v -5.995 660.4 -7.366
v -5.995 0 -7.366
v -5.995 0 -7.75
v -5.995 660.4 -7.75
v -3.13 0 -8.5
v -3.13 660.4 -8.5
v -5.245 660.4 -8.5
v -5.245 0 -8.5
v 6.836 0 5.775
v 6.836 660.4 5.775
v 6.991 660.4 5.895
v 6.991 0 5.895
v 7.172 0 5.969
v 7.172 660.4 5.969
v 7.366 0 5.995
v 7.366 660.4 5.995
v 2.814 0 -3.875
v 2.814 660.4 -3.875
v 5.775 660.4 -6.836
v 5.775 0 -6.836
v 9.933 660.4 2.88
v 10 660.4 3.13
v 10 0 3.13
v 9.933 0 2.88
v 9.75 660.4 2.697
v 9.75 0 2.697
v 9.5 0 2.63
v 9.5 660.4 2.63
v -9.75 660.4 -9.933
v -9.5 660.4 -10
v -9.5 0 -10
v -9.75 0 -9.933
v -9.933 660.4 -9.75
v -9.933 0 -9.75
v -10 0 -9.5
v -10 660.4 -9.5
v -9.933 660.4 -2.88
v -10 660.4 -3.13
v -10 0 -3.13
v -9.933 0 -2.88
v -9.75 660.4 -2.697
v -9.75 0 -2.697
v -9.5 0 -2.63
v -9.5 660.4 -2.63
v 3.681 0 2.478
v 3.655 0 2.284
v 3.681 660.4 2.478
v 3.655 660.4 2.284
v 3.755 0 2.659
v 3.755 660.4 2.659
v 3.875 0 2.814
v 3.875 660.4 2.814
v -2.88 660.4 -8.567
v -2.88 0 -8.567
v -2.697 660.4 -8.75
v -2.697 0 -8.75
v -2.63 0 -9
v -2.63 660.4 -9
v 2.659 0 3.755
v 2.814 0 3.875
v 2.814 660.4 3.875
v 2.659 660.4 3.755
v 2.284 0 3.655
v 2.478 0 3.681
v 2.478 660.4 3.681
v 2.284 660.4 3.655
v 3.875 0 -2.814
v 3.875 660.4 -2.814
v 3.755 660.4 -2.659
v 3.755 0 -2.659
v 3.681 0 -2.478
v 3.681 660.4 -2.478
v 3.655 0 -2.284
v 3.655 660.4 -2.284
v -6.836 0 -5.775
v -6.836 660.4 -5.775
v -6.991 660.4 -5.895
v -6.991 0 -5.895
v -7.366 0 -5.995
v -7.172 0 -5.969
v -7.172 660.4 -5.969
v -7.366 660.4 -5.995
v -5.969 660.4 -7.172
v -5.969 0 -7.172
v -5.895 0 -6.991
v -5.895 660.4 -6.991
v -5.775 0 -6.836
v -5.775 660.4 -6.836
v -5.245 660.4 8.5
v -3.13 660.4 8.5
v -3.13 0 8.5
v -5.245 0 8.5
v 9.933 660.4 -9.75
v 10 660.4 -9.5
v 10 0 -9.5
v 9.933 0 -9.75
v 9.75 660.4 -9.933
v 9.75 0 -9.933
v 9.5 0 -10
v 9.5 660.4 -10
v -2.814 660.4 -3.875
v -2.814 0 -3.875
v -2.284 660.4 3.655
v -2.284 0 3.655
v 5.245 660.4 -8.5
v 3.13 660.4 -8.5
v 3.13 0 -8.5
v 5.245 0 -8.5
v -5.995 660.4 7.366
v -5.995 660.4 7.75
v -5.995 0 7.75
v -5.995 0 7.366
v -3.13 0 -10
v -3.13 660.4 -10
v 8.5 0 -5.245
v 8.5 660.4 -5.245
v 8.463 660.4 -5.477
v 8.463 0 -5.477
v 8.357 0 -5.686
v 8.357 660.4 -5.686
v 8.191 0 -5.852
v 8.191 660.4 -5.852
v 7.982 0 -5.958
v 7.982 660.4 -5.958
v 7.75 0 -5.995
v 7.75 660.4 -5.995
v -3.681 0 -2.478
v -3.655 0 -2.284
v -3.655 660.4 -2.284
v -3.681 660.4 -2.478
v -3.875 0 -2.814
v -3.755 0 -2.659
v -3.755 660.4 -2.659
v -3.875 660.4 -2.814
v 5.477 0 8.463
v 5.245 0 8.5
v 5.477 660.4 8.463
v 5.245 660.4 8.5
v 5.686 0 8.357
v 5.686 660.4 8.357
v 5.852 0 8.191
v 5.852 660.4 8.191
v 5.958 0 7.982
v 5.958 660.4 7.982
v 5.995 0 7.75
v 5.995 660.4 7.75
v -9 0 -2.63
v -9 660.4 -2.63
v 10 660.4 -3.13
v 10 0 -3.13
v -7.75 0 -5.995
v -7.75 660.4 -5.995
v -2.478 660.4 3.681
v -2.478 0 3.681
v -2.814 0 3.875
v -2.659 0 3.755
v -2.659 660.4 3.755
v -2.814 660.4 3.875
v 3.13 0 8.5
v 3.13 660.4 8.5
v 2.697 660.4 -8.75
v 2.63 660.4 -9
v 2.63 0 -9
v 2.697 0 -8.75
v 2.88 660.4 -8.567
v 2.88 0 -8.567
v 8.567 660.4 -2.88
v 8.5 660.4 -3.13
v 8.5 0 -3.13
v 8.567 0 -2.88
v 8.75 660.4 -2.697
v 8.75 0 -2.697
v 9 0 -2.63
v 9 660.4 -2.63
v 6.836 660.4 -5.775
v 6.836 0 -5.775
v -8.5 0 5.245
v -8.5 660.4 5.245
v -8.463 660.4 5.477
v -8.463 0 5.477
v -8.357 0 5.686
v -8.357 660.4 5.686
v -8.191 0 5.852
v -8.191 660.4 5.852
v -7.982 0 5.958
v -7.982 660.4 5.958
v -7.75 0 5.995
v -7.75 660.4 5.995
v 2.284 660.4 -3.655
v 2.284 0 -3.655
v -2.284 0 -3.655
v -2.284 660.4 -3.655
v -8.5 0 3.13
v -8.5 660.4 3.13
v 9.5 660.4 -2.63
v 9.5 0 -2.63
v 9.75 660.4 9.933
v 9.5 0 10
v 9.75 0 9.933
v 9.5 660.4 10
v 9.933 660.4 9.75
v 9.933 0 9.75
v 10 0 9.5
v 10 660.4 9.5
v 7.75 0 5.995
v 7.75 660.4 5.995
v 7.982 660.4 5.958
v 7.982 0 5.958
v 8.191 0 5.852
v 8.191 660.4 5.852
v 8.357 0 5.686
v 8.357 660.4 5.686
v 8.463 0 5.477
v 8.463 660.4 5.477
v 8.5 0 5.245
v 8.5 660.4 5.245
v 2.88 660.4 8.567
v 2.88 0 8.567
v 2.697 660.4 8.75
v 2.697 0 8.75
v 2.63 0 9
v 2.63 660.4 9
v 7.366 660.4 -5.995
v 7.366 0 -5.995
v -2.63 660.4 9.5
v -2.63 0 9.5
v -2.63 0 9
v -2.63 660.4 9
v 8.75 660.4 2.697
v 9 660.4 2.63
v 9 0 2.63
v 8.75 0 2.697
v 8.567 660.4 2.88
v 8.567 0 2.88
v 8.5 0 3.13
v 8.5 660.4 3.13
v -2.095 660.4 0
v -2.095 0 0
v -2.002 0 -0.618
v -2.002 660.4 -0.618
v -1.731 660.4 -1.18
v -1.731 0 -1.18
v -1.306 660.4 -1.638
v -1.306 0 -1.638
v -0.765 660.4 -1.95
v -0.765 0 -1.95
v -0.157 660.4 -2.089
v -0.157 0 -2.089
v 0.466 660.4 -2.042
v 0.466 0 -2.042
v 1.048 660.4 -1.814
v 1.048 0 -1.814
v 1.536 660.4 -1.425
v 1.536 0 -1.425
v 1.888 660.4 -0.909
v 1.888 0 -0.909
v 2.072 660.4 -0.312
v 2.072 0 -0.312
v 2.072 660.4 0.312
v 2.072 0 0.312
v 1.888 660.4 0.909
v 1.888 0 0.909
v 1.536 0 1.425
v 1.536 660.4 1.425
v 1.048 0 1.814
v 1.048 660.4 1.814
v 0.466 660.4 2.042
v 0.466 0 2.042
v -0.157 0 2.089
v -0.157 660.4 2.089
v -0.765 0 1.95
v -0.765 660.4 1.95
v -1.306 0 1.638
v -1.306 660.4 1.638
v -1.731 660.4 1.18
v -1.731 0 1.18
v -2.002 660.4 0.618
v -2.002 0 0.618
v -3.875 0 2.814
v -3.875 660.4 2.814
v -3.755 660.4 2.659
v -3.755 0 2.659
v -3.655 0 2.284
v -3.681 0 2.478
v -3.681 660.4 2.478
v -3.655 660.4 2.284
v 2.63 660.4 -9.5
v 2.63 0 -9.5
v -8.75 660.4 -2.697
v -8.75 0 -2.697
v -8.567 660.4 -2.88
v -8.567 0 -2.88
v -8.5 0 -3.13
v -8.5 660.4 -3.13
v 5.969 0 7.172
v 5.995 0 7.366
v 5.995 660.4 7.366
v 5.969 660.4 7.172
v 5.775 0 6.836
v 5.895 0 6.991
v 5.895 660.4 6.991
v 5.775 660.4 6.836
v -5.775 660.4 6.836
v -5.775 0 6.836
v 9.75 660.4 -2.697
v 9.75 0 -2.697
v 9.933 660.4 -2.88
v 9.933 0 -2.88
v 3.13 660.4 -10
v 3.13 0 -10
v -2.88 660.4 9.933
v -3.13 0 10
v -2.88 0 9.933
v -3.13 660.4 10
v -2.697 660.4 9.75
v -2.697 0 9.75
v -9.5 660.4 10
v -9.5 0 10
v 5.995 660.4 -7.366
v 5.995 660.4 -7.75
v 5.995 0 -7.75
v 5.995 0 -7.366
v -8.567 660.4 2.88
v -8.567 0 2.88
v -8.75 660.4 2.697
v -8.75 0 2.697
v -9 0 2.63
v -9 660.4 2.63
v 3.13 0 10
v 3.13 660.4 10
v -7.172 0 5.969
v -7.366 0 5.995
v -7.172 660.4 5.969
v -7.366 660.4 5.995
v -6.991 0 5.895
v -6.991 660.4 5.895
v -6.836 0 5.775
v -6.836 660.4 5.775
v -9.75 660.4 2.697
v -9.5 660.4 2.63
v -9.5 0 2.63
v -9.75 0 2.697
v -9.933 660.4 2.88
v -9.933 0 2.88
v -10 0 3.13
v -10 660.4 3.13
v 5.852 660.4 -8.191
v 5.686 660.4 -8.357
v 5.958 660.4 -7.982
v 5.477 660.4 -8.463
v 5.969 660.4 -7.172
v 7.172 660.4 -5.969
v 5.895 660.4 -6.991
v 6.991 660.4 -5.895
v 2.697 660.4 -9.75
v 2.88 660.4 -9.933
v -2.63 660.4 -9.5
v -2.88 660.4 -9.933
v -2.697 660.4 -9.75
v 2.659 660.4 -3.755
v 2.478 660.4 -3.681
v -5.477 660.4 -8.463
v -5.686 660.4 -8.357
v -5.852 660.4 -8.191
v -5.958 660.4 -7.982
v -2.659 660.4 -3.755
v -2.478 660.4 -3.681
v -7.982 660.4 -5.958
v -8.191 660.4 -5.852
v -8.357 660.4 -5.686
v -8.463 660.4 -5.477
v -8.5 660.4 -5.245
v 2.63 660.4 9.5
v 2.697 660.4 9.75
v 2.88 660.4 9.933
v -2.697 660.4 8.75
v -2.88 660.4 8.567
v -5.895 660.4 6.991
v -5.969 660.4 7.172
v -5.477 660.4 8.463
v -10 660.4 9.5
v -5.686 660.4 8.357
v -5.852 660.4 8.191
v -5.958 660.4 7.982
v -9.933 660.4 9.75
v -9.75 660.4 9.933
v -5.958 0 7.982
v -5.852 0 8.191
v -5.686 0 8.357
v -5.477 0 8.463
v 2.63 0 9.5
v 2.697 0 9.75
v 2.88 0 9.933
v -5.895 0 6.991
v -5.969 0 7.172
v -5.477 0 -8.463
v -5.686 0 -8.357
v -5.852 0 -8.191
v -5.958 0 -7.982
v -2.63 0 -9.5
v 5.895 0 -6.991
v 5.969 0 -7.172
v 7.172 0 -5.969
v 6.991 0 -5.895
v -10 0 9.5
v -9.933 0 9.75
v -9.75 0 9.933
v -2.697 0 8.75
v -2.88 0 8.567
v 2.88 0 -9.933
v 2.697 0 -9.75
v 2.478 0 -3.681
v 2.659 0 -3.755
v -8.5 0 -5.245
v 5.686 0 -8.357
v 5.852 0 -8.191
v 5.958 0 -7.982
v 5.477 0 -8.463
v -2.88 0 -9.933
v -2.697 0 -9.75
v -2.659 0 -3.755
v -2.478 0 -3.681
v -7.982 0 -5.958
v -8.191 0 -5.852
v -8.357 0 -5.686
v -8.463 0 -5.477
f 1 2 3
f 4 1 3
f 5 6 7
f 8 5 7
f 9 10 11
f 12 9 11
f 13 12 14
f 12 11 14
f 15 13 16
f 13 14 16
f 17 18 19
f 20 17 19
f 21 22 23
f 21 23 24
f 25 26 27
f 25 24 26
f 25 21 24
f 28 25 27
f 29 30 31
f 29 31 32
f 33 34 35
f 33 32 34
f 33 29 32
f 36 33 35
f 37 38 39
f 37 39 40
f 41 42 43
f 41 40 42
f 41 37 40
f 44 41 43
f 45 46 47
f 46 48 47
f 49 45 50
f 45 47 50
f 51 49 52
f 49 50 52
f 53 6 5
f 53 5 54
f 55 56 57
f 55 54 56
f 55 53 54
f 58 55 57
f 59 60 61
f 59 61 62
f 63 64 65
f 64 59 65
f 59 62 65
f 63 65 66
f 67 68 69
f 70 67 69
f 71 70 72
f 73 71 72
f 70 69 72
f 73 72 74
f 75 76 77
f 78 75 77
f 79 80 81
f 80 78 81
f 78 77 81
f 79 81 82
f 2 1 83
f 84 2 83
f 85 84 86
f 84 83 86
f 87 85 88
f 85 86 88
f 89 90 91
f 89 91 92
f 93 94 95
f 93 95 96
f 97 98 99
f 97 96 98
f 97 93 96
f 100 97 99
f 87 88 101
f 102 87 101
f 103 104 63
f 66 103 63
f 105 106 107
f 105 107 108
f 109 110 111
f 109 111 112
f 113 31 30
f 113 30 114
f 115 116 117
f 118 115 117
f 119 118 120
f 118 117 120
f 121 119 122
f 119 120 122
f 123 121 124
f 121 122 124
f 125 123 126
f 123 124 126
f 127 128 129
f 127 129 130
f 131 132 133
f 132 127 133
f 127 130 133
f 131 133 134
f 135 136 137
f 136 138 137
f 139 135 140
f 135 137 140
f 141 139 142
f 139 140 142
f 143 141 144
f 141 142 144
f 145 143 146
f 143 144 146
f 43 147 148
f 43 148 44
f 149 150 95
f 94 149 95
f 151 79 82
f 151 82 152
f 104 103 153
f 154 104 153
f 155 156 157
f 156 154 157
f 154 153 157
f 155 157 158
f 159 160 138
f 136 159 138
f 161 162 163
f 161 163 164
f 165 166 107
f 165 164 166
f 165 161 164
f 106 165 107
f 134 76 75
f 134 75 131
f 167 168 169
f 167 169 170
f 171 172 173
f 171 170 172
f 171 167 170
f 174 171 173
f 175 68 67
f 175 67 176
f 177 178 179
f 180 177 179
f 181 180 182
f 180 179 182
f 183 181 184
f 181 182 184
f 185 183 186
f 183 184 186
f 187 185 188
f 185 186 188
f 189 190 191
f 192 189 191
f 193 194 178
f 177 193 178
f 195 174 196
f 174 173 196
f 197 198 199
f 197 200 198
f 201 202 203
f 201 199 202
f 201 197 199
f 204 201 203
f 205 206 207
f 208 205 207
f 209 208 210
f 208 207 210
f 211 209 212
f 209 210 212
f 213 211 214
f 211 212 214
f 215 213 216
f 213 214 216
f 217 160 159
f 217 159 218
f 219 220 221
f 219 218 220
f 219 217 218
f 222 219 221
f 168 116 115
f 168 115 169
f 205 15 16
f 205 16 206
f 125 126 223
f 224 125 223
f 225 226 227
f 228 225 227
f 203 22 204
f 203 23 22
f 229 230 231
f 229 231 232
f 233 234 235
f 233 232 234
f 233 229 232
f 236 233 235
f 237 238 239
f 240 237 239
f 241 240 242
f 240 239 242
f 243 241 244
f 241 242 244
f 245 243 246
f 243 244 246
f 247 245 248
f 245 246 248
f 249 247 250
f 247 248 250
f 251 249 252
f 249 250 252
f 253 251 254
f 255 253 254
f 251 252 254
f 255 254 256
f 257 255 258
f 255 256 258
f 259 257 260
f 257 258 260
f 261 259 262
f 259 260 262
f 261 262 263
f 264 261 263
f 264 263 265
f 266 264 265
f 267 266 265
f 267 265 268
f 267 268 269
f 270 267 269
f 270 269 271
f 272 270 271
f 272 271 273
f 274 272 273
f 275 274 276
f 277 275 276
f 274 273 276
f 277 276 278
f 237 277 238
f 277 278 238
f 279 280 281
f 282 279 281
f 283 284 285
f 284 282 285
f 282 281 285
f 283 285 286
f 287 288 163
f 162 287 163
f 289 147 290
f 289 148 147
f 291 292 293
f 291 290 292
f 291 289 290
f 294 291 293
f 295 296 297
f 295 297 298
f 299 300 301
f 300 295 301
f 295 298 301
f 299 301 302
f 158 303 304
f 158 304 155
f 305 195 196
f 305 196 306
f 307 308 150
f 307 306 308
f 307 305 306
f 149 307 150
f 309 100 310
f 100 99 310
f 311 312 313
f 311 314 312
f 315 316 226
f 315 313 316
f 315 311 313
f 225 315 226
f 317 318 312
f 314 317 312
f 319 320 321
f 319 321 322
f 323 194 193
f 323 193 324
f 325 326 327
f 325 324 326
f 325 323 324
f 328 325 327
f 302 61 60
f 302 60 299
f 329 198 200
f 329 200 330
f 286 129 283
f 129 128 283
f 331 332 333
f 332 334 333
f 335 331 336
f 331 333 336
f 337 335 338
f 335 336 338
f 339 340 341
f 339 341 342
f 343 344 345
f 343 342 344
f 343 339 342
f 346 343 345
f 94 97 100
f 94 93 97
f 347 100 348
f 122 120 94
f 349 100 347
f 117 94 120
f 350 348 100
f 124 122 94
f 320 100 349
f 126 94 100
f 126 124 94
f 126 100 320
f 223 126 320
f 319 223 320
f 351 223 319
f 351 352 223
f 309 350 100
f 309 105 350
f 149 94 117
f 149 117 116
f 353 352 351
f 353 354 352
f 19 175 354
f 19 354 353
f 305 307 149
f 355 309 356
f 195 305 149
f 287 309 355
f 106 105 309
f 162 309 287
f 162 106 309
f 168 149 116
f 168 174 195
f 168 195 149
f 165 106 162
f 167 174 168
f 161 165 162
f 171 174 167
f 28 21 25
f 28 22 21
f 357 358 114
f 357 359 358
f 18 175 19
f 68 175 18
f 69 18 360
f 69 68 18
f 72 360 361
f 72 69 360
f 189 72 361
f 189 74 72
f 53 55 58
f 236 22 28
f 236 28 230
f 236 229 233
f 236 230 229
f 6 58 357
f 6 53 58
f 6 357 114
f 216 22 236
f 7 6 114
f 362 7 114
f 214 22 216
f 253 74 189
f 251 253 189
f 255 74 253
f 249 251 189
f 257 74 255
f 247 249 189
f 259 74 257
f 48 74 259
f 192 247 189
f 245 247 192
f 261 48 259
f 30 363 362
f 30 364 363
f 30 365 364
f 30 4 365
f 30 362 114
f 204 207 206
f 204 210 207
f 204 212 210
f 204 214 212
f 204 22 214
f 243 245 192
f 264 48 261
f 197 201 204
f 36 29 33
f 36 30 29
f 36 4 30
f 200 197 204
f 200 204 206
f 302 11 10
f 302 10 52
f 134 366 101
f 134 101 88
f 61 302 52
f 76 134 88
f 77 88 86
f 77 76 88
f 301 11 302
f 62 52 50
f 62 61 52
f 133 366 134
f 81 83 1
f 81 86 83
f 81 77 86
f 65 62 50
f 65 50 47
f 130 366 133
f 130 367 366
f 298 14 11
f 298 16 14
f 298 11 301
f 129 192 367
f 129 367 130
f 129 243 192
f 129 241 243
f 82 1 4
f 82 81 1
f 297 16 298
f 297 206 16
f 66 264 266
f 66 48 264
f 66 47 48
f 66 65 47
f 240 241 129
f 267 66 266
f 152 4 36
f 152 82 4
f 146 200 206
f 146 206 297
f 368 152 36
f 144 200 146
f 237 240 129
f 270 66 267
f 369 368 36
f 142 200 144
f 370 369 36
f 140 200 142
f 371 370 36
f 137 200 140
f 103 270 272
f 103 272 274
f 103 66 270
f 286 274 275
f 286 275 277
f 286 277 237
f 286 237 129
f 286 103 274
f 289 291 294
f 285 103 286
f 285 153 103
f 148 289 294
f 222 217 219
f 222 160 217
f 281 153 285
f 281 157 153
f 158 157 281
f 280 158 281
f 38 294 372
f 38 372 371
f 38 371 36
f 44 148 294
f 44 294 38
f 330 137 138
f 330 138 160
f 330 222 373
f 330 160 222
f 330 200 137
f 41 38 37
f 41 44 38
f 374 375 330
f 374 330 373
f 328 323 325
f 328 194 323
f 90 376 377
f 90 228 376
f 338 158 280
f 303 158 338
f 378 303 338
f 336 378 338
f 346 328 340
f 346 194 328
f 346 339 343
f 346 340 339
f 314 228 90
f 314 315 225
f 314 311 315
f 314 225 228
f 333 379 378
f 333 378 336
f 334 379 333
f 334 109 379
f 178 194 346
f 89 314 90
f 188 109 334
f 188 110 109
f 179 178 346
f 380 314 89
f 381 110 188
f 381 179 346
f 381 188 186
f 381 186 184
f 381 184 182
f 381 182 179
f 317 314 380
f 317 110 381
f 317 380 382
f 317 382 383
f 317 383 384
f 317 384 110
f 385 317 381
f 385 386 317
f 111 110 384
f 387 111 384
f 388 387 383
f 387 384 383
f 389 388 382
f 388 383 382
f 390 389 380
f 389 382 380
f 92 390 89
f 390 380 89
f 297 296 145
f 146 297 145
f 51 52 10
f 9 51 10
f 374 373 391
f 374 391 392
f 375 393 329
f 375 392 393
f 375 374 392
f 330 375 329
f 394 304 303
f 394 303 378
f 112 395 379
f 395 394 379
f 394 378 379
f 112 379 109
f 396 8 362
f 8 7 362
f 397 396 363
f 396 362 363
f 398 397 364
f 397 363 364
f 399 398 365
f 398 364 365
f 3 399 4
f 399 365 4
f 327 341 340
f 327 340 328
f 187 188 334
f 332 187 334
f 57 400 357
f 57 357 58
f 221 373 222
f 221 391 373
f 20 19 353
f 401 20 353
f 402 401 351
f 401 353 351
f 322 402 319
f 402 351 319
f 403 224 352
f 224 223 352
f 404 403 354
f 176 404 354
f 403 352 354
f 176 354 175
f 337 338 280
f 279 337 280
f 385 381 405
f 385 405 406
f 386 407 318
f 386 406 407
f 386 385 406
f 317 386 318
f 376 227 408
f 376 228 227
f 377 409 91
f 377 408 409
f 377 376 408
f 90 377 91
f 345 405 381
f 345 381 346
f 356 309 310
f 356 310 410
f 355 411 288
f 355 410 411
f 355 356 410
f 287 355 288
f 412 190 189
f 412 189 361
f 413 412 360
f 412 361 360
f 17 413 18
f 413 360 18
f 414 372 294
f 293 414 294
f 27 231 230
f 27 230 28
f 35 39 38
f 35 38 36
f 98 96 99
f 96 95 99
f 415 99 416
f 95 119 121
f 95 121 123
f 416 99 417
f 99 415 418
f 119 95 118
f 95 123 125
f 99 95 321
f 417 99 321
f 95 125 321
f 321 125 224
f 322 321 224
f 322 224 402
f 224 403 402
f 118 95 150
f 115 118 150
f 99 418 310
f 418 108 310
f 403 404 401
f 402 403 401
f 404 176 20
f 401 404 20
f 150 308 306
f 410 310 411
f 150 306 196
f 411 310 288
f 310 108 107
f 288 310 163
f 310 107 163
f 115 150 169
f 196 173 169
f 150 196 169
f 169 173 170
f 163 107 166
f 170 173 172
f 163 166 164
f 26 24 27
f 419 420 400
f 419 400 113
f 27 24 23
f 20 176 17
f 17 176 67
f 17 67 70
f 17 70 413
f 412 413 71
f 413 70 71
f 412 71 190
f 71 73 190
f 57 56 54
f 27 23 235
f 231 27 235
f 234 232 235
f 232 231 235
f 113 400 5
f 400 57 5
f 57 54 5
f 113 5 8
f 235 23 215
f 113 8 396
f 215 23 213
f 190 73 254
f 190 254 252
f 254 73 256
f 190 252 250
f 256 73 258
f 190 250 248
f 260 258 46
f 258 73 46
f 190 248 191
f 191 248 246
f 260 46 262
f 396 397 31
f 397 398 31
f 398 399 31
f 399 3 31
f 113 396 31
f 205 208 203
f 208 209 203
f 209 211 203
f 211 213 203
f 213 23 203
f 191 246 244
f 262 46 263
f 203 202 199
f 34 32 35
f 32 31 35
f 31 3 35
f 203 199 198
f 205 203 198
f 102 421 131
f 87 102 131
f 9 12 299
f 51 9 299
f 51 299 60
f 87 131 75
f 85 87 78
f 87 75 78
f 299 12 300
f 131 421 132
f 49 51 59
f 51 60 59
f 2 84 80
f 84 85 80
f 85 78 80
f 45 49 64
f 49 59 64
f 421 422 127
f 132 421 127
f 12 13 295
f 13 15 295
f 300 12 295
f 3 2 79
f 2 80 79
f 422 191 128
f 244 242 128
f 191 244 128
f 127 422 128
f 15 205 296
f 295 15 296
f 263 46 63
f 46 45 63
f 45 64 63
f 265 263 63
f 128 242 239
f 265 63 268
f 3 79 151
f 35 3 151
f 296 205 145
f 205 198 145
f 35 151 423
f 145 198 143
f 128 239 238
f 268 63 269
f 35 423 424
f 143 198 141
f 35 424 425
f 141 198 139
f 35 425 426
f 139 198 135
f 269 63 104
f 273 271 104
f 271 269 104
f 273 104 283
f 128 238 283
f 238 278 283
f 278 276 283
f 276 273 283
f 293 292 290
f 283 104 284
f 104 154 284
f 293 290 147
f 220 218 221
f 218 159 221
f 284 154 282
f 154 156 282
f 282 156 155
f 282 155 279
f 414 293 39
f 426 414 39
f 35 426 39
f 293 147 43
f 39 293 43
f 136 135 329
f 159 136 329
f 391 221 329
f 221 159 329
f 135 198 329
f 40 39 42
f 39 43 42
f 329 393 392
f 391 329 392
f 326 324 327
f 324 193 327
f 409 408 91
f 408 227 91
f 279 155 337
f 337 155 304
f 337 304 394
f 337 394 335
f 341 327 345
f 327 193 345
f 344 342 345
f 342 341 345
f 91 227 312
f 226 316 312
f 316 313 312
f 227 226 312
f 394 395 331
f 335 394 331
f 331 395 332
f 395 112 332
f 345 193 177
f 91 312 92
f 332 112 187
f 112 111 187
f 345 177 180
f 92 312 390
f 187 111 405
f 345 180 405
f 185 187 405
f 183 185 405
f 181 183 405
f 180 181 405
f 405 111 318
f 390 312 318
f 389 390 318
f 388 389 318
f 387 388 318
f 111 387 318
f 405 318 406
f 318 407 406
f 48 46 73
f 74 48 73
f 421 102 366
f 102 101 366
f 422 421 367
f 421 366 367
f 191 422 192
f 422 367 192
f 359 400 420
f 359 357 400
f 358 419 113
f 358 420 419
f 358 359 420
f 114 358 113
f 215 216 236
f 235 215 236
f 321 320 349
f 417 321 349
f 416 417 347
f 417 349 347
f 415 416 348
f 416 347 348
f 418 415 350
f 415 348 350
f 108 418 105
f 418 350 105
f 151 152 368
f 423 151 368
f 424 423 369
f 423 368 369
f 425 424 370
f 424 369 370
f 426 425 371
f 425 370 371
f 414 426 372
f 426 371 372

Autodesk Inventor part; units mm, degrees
ref_plane "YZ Plane" through (0, 0, 0) normal (1, 0, 0) x (0, 1, 0)
ref_plane "XZ Plane" through (0, 0, 0) normal (0, 1, 0) x (-1, 0, 0)
ref_plane "XY Plane" through (0, 0, 0) normal (0, 0, 1) x (1, 0, 0)
sketch "Sketch1" plane through (0, 0, 0) normal (0, 1, 0) x (-1, 0, 0)
  line L0 (0, -14) -> (0, 14) projected
  line L1 (-14, 0) -> (14, 0) projected
  line L2 (14, 0) -> (-14, 0) projected
  line L3 (0, -14) -> (0, 14) projected
  line L4 (2.5943, 3.655) -> (-2.5943, 3.655)
  line L5 (-3.655, 2.5943) -> (-3.655, -2.5943)
  line L6 (-2.5943, -3.655) -> (2.5943, -3.655)
  line L7 (3.655, -2.5943) -> (3.655, 2.5943)
  line L8 (-3.655, 3.655) -> (3.655, -3.655) construction
  line L9 (10, 10) -> (10, 2.63)
  line L10 (10, 2.63) -> (8.5, 2.63)
  line L11 (10, 10) -> (2.63, 10)
  line L12 (2.63, 10) -> (2.63, 8.5)
  line L13 (-10, 10) -> (-2.63, 10)
  line L14 (-2.63, 10) -> (-2.63, 8.5)
  line L15 (-10, 8.5) -> (-10, 10)
  line L16 (-10, 10) -> (-8.5, 10)
  line L17 (-8.5, 2.63) -> (-10, 2.63)
  line L18 (-10, 2.63) -> (-10, 10)
  line L19 (-10, -10) -> (-8.5, -10)
  line L20 (-8.5, -2.63) -> (-10, -2.63)
  line L21 (-10, -2.63) -> (-10, -10)
  line L22 (-10, -10) -> (-2.63, -10)
  line L23 (-2.63, -10) -> (-2.63, -8.5)
  line L24 (-10, -8.5) -> (-10, -10)
  line L25 (10, -10) -> (8.5, -10)
  line L26 (8.5, -2.63) -> (10, -2.63)
  line L27 (10, -2.63) -> (10, -10)
  line L28 (10, -10) -> (2.63, -10)
  line L29 (2.63, -10) -> (2.63, -8.5)
  line L30 (10, -8.5) -> (10, -10)
  circle A0 centre (0, 0) radius 2.095
  line L31 (5.995, -10) -> (2.63, -10)
  line L32 (-2.63, -10) -> (-5.995, -10)
  line L33 (10, -10) -> (2.63, -10)
  line L34 (-2.63, -10) -> (-10, -10)
  line L35 (10, -5.995) -> (10, -2.63)
  line L36 (10, 2.63) -> (10, 5.995)
  line L37 (10, 10) -> (10, 2.63)
  line L38 (10, -2.63) -> (10, -10)
  line L39 (-5.995, 10) -> (-2.63, 10)
  line L40 (2.63, 10) -> (5.995, 10)
  line L41 (-10, 10) -> (-2.63, 10)
  line L42 (2.63, 10) -> (10, 10)
  line L43 (-10, 5.995) -> (-10, 2.63)
  line L44 (-10, -2.63) -> (-10, -5.995)
  line L45 (-10, -10) -> (-10, -2.63)
  line L46 (-10, 2.63) -> (-10, 10)
  line L47 (-2.63, -8.5) -> (-5.995, -8.5)
  line L48 (-8.5, -5.995) -> (-8.5, -2.63)
  line L49 (-8.5, -5.995) -> (-7.0557, -5.995)
  line L50 (-5.995, -8.5) -> (-5.995, -7.0557)
  line L51 (-5.995, 7.0557) -> (-5.995, 8.5)
  line L52 (2.63, 8.5) -> (5.995, 8.5)
  line L53 (8.5, 2.63) -> (8.5, 5.995)
  line L54 (8.5, 5.995) -> (7.0557, 5.995)
  line L55 (5.995, 8.5) -> (5.995, 7.0557)
  line L56 (2.63, -8.5) -> (5.995, -8.5)
  line L57 (9.5607, -8.5) -> (10, -8.5)
  line L58 (8.5, -10) -> (8.5, -9.5607)
  line L59 (8.5, -5.995) -> (8.5, -2.63)
  line L60 (7.0557, -5.995) -> (8.5, -5.995)
  line L61 (5.995, -7.0557) -> (5.995, -8.5)
  line L62 (3.655, 3.655) -> (-0.5303, -0.5303) construction
  line L63 (-1.4814, -1.4814) -> (-3.655, -3.655) construction
  line L64 (-8.5, 10) -> (-8.5, 9.5607)
  line L65 (-8.5, 5.995) -> (-8.5, 2.63)
  line L66 (-2.63, 8.5) -> (-5.995, 8.5)
  line L67 (-9.5607, 8.5) -> (-10, 8.5)
  line L68 (-7.0557, 5.995) -> (-8.5, 5.995)
  line L69 (-3.655, 2.5943) -> (-7.0557, 5.995)
  line L70 (-2.5943, 3.655) -> (-5.995, 7.0557)
  line L71 (5.995, 7.0557) -> (2.5943, 3.655)
  line L72 (7.0557, 5.995) -> (3.655, 2.5943)
  line L73 (7.0557, -5.995) -> (3.655, -2.5943)
  line L74 (5.995, -7.0557) -> (2.5943, -3.655)
  line L75 (-2.5943, -3.655) -> (-5.995, -7.0557)
  line L76 (-3.655, -2.5943) -> (-7.0557, -5.995)
  dimension "d26" = 4.19
  dimension "d0" = 20
  dimension "d1" = 20
  dimension "d2" = 7.31
  dimension "d3" = 7.31
  dimension "d4" = 20
  dimension "d5" = 11.99
  dimension "d6" = 11.99
  dimension "d11" = 7.37
  dimension "d12" = 1.5
  dimension "d13" = 7.37
  dimension "d14" = 1.5
  dimension "d15" = 7.37
  dimension "d16" = 1.5
  dimension "d17" = 7.37
  dimension "d18" = 1.5
  dimension "d19" = 7.37
  dimension "d20" = 7.37
  dimension "d21" = 1.5
  dimension "d22" = 1.5
  dimension "d23" = 7.37
  dimension "d24" = 7.37
  dimension "d25" = 1.5
extrude "Extrusion1" add sketch "Sketch1" along normal blind 660.4 contours L6 L75 L50 L47 L23 L22 L19 L21 L20 L48 L49 L76 L5 L1 A0 L0 | L0 A0 L1 L7 L73 L60 L59 L26 L27 L25 L28 L29 L56 L61 L74 L6 | L1 L5 L69 L68 L65 L17 L18 L15 L13 L14 L66 L51 L70 L4 L0 A0 | A0 L0 L4 L71 L55 L52 L12 L11 L9 L10 L53 L54 L72 L7 L1
fillet "Fillet1" radius 0.5 20 edges at (10, 330.2, 10) (2.63, 330.2, 10) (-2.63, 330.2, 10) (-2.63, 330.2, 8.5) (10, 330.2, 2.63) (8.5, 330.2, 2.63) (10, 330.2, -2.63) (8.5, 330.2, -2.63) (10, 330.2, -10) (2.63, 330.2, -8.5) (-2.63, 330.2, -10) (-2.63, 330.2, -8.5) (2.63, 330.2, -10) (-10, 330.2, -10) (-8.5, 330.2, -2.63) (-10, 330.2, -2.63) (-8.5, 330.2, 2.63) (-10, 330.2, 2.63) (-10, 330.2, 10) (2.63, 330.2, 8.5)
fillet "Fillet2" radius 0.75 24 edges at (-7.0557, 330.2, 5.995) (-3.655, 330.2, 2.5943) (-8.5, 330.2, -5.995) (-7.0557, 330.2, -5.995) (-5.995, 330.2, -8.5) (3.655, 330.2, -2.5943) (7.0557, 330.2, -5.995) (-2.5943, 330.2, 3.655) (-5.995, 330.2, 7.0557) (3.655, 330.2, 2.5943) (7.0557, 330.2, 5.995) (8.5, 330.2, 5.995) (8.5, 330.2, -5.995) (2.5943, 330.2, 3.655) (5.995, 330.2, 7.0557) (5.995, 330.2, 8.5) (-5.995, 330.2, 8.5) (-8.5, 330.2, 5.995) (2.5943, 330.2, -3.655) (5.995, 330.2, -7.0557) (5.995, 330.2, -8.5) (-5.995, 330.2, -7.0557) (-2.5943, 330.2, -3.655) (-3.655, 330.2, -2.5943)
properties part number "pro36in"
